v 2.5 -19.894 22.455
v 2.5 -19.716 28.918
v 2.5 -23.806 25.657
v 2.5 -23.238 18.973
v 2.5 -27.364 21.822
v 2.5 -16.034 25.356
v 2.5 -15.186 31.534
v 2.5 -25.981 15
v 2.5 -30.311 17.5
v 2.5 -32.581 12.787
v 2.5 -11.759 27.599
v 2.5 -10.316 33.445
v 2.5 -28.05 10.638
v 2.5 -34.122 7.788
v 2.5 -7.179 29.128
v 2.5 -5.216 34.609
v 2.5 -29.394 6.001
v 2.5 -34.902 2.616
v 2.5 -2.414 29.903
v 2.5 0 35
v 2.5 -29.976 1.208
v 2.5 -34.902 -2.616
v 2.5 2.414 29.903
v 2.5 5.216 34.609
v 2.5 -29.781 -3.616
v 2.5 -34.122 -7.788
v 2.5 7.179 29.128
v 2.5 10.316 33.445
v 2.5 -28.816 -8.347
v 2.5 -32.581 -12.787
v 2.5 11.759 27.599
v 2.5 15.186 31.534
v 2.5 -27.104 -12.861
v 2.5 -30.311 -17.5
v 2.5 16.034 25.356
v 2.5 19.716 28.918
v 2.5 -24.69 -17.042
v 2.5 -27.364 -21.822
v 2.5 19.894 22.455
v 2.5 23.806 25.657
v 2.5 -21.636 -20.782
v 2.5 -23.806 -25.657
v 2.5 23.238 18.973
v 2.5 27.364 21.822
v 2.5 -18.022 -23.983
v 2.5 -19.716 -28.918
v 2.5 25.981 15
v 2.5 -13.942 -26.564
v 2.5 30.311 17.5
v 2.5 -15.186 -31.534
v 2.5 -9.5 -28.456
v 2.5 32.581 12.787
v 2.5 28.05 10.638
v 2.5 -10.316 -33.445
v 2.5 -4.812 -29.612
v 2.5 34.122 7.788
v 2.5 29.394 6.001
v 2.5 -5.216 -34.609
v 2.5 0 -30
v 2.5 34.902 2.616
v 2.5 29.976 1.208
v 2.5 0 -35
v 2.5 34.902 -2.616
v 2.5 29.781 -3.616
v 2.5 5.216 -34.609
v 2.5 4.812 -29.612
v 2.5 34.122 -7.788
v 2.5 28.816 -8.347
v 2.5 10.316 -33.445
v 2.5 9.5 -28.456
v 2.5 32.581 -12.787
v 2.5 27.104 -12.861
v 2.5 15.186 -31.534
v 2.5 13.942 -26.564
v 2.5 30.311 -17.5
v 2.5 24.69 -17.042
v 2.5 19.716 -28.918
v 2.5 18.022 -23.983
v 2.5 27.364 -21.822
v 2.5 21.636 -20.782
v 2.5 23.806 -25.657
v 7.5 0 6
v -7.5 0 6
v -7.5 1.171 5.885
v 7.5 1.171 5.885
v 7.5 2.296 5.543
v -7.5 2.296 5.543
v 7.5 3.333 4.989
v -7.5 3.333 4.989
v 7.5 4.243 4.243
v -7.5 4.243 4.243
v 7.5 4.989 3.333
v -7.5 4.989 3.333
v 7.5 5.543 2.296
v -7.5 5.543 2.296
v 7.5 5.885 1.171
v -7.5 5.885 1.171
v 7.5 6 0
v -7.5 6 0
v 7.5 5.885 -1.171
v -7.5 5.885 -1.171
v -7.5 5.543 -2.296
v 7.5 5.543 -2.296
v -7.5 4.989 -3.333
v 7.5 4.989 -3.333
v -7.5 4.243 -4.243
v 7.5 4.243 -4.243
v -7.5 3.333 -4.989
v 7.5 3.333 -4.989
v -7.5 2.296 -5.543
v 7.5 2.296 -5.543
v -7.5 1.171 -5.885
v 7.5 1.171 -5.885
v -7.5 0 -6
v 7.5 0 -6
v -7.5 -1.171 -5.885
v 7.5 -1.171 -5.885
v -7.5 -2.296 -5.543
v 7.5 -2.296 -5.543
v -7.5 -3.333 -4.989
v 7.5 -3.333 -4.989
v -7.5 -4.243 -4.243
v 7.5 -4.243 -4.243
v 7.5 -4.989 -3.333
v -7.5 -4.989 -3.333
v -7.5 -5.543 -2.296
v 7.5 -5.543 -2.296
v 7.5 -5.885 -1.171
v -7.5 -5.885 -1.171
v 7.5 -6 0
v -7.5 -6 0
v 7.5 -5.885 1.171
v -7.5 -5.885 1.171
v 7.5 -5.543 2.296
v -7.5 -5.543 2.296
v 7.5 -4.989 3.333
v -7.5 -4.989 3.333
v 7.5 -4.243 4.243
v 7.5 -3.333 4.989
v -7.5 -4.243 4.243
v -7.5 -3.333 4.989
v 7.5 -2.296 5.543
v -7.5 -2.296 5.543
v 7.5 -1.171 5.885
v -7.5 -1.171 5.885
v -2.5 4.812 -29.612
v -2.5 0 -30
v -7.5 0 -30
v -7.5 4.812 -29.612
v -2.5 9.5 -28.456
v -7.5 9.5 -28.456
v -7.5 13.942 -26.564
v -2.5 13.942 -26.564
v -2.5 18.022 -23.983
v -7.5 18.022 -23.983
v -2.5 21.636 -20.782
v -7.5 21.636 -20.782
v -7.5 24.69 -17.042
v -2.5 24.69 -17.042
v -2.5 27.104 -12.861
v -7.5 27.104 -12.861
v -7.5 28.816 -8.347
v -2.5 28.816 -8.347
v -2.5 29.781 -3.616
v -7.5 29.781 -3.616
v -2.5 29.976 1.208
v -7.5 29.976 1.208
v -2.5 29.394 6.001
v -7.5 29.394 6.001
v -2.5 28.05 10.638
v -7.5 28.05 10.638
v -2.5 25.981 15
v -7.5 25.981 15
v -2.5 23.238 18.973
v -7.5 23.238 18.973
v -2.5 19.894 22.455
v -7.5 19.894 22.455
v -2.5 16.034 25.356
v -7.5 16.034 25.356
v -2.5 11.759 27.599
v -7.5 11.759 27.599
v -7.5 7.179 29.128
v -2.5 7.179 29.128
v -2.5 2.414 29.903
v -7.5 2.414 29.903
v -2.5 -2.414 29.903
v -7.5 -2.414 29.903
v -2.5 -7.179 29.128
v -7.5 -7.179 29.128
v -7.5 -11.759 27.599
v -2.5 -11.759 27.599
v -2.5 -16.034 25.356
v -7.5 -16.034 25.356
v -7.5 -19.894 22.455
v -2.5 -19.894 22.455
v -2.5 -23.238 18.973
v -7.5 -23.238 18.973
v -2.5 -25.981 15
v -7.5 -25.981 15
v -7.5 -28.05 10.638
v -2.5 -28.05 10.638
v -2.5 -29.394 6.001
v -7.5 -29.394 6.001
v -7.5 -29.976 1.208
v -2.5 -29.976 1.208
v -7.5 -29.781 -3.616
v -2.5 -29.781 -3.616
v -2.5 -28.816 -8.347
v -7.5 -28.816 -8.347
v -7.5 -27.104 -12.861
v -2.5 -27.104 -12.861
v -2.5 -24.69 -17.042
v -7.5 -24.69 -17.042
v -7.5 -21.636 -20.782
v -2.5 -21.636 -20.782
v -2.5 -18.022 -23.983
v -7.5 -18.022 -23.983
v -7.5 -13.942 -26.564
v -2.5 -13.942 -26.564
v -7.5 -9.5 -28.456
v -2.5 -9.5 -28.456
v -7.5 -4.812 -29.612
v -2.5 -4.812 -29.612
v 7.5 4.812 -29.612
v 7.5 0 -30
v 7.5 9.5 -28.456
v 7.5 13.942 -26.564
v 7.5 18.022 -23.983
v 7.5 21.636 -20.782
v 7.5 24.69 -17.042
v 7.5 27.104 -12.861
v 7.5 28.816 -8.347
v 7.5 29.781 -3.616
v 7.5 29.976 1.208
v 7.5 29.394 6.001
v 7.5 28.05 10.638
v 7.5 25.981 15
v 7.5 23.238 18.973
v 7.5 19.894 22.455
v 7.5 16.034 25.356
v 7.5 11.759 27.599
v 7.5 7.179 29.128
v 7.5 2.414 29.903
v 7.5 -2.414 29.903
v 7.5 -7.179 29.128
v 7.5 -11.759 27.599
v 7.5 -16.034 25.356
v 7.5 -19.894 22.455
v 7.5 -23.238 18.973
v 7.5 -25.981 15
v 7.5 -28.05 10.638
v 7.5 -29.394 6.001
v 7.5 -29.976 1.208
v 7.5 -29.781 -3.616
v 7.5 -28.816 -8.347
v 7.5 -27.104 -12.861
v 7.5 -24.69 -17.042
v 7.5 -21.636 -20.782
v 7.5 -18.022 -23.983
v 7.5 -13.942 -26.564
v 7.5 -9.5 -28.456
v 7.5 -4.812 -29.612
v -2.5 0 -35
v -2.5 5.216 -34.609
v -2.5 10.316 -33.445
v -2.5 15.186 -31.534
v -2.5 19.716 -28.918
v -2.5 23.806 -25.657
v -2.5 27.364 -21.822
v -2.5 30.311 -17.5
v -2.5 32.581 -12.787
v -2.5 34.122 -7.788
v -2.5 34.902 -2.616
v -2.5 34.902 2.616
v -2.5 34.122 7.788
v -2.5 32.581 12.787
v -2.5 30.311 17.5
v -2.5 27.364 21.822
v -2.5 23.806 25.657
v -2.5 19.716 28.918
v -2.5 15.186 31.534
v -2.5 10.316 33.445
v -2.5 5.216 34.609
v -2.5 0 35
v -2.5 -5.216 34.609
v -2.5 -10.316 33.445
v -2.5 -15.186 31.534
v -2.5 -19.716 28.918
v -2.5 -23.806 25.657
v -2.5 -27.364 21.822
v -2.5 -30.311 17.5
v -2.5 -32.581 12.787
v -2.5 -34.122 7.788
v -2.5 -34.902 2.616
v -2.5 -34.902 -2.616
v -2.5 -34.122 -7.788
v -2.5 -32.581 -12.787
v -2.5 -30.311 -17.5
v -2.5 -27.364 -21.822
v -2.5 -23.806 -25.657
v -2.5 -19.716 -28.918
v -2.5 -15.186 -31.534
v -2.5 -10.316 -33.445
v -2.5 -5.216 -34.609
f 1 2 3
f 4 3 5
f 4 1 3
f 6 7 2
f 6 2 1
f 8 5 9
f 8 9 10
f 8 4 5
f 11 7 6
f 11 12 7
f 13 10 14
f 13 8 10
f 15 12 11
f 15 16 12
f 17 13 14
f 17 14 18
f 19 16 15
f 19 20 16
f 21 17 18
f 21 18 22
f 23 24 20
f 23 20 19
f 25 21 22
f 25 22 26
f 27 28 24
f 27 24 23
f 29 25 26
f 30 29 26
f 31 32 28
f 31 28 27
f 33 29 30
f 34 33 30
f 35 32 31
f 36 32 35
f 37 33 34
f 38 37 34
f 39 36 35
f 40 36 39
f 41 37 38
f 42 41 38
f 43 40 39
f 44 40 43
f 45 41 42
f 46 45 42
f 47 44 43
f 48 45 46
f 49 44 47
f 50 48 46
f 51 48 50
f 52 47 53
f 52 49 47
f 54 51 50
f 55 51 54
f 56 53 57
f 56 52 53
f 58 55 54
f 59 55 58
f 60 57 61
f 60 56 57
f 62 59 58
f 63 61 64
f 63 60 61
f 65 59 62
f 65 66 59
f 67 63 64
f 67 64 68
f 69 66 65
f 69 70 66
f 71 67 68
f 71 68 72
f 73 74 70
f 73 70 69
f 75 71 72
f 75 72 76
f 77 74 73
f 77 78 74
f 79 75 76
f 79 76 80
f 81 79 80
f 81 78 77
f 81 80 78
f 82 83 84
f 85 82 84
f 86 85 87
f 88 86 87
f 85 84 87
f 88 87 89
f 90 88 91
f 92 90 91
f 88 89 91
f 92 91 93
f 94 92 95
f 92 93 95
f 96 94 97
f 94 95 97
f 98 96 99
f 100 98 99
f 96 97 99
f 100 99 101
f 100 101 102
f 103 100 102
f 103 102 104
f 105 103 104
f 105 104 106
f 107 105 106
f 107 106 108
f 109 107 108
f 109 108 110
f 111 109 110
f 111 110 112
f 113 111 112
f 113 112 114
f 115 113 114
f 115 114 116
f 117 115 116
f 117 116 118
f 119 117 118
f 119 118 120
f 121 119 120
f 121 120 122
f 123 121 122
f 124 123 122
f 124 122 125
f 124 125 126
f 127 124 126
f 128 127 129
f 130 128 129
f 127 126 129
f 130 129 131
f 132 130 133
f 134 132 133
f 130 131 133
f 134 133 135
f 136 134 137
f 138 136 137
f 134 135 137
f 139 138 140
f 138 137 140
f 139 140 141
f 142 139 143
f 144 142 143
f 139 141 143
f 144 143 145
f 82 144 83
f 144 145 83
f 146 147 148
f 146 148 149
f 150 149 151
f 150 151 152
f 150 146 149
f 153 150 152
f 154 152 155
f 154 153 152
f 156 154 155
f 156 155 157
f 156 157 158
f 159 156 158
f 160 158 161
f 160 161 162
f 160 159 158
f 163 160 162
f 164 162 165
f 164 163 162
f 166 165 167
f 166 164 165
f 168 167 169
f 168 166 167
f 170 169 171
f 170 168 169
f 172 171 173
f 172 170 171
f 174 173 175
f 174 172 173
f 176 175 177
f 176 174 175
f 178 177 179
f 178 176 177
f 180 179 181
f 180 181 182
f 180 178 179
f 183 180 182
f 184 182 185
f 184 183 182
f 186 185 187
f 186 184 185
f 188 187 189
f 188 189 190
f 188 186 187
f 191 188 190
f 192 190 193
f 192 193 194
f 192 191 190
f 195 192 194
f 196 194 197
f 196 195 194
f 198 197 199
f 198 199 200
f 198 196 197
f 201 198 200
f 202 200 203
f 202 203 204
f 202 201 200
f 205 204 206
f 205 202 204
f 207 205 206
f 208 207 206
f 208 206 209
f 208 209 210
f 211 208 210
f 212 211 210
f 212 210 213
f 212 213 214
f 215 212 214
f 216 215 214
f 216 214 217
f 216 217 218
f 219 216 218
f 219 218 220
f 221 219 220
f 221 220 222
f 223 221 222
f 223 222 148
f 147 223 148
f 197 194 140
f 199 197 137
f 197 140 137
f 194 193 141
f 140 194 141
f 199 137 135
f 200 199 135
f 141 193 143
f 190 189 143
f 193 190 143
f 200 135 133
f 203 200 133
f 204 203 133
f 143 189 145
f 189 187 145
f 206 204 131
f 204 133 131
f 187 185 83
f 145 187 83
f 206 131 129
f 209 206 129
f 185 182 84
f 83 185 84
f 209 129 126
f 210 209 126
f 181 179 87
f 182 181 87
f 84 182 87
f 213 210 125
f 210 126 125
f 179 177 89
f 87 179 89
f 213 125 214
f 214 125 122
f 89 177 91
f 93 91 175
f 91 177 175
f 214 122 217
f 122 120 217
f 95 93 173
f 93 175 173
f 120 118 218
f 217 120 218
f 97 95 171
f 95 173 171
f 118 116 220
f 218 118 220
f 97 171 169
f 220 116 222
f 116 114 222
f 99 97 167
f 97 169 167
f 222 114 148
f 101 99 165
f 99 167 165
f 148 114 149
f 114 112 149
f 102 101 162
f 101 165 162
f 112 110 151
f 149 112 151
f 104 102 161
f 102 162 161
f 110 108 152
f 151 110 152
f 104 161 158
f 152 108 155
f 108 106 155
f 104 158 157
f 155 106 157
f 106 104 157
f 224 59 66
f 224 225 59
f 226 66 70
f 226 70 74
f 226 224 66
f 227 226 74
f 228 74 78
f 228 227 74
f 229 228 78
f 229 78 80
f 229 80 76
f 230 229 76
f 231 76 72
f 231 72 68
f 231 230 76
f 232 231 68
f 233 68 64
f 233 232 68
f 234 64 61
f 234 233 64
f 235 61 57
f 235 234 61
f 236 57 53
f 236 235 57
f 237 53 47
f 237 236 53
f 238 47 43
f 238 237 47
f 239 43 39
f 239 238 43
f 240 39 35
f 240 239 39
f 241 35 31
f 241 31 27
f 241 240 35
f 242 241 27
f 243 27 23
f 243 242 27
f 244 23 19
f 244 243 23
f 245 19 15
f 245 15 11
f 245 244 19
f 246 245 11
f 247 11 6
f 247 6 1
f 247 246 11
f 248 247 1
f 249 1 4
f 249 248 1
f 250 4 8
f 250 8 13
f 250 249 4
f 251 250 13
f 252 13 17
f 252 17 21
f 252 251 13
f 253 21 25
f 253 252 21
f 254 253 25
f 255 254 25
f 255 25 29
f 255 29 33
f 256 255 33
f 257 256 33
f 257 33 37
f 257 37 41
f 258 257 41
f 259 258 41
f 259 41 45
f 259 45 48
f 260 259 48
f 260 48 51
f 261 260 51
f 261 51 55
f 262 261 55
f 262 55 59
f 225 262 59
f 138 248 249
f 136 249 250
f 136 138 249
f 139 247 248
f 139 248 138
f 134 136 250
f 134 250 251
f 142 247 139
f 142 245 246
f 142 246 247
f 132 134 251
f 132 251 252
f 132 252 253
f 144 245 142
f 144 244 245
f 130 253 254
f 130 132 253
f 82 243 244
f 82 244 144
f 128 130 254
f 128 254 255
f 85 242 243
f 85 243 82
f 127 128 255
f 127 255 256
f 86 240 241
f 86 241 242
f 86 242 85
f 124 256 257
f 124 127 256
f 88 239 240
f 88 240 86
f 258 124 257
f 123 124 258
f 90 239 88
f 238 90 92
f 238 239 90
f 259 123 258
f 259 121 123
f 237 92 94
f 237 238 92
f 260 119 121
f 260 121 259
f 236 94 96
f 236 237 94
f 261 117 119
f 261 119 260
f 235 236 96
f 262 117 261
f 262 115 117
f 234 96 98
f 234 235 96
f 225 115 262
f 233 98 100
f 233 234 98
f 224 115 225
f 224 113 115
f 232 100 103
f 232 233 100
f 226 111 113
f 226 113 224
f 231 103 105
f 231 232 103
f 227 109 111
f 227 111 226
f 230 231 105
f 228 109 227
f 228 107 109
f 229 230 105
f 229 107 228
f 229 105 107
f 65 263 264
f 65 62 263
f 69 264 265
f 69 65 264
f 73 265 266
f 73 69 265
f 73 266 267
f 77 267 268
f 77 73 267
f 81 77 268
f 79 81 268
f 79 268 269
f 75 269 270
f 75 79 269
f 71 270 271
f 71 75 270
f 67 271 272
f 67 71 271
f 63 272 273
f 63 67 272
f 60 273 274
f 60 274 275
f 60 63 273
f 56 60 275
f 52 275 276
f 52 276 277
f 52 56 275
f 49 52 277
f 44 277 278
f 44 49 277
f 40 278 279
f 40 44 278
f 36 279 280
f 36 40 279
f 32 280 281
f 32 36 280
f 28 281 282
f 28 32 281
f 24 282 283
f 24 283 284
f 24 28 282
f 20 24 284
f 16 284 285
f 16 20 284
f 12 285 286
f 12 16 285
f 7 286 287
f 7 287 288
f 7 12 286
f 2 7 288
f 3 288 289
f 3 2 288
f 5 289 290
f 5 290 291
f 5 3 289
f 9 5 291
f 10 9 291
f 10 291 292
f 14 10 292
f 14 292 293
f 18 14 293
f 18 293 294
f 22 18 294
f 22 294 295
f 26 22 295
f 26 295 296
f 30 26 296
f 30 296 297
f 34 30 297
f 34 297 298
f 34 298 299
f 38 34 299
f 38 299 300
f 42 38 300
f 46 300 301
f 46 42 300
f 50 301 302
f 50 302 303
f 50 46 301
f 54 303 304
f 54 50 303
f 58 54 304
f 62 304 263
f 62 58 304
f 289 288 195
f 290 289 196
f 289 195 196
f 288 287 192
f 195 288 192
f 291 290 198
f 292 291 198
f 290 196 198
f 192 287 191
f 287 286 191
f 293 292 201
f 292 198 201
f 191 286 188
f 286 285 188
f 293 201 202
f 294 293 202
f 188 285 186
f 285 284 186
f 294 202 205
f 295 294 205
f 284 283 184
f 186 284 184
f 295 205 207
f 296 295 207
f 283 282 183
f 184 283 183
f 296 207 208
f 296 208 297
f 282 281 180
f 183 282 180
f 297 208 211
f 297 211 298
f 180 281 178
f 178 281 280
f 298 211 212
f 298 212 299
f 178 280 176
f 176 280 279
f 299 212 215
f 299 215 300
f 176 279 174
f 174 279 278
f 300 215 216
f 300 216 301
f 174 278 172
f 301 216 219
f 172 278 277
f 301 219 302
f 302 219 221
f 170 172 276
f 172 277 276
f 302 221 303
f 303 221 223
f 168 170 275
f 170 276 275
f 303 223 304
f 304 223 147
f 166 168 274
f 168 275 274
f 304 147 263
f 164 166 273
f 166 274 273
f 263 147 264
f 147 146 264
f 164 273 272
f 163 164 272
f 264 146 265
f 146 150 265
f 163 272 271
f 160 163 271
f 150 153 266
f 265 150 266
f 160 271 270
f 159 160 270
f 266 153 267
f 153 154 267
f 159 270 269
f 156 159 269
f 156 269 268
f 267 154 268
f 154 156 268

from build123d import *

# Parameters (mm, degrees)
SKETCH1_R                          = 30
CORPO_DA_RODA_DEPTH                = 7.5
SKETCH8_R                          = 35
BOSS_EXTRUDE2_DEPTH                = 2.5
FURO_DO_HUB_MESMO_DI_METRO_1_0_1_D = 12


with BuildPart() as part:
    # Sketch1 → Corpo da Roda (new, symmetric)
    with BuildSketch(Plane(origin=(0, 0, 0), x_dir=(0, 0, -1), z_dir=(1, 0, 0))):
        Circle(SKETCH1_R)
    extrude(amount=CORPO_DA_RODA_DEPTH, both=True)

    # Sketch8 → Boss-Extrude2 (add, symmetric)
    with BuildSketch(Plane(origin=(0, 0, 0), x_dir=(0, 0, -1), z_dir=(1, 0, 0))):
        Circle(SKETCH8_R)
    extrude(amount=BOSS_EXTRUDE2_DEPTH, both=True)

    # Furo do Hub (mesmo diâmetro) - Ø1.0 (1) Diameter Hole1 (through all)
    with Locations(Plane(origin=(7.5, 0, 0), x_dir=(0, 0, -1), z_dir=(1, 0, 0))):
        with Locations((0, 0)):
            Hole(FURO_DO_HUB_MESMO_DI_METRO_1_0_1_D / 2)


solid = part.part
